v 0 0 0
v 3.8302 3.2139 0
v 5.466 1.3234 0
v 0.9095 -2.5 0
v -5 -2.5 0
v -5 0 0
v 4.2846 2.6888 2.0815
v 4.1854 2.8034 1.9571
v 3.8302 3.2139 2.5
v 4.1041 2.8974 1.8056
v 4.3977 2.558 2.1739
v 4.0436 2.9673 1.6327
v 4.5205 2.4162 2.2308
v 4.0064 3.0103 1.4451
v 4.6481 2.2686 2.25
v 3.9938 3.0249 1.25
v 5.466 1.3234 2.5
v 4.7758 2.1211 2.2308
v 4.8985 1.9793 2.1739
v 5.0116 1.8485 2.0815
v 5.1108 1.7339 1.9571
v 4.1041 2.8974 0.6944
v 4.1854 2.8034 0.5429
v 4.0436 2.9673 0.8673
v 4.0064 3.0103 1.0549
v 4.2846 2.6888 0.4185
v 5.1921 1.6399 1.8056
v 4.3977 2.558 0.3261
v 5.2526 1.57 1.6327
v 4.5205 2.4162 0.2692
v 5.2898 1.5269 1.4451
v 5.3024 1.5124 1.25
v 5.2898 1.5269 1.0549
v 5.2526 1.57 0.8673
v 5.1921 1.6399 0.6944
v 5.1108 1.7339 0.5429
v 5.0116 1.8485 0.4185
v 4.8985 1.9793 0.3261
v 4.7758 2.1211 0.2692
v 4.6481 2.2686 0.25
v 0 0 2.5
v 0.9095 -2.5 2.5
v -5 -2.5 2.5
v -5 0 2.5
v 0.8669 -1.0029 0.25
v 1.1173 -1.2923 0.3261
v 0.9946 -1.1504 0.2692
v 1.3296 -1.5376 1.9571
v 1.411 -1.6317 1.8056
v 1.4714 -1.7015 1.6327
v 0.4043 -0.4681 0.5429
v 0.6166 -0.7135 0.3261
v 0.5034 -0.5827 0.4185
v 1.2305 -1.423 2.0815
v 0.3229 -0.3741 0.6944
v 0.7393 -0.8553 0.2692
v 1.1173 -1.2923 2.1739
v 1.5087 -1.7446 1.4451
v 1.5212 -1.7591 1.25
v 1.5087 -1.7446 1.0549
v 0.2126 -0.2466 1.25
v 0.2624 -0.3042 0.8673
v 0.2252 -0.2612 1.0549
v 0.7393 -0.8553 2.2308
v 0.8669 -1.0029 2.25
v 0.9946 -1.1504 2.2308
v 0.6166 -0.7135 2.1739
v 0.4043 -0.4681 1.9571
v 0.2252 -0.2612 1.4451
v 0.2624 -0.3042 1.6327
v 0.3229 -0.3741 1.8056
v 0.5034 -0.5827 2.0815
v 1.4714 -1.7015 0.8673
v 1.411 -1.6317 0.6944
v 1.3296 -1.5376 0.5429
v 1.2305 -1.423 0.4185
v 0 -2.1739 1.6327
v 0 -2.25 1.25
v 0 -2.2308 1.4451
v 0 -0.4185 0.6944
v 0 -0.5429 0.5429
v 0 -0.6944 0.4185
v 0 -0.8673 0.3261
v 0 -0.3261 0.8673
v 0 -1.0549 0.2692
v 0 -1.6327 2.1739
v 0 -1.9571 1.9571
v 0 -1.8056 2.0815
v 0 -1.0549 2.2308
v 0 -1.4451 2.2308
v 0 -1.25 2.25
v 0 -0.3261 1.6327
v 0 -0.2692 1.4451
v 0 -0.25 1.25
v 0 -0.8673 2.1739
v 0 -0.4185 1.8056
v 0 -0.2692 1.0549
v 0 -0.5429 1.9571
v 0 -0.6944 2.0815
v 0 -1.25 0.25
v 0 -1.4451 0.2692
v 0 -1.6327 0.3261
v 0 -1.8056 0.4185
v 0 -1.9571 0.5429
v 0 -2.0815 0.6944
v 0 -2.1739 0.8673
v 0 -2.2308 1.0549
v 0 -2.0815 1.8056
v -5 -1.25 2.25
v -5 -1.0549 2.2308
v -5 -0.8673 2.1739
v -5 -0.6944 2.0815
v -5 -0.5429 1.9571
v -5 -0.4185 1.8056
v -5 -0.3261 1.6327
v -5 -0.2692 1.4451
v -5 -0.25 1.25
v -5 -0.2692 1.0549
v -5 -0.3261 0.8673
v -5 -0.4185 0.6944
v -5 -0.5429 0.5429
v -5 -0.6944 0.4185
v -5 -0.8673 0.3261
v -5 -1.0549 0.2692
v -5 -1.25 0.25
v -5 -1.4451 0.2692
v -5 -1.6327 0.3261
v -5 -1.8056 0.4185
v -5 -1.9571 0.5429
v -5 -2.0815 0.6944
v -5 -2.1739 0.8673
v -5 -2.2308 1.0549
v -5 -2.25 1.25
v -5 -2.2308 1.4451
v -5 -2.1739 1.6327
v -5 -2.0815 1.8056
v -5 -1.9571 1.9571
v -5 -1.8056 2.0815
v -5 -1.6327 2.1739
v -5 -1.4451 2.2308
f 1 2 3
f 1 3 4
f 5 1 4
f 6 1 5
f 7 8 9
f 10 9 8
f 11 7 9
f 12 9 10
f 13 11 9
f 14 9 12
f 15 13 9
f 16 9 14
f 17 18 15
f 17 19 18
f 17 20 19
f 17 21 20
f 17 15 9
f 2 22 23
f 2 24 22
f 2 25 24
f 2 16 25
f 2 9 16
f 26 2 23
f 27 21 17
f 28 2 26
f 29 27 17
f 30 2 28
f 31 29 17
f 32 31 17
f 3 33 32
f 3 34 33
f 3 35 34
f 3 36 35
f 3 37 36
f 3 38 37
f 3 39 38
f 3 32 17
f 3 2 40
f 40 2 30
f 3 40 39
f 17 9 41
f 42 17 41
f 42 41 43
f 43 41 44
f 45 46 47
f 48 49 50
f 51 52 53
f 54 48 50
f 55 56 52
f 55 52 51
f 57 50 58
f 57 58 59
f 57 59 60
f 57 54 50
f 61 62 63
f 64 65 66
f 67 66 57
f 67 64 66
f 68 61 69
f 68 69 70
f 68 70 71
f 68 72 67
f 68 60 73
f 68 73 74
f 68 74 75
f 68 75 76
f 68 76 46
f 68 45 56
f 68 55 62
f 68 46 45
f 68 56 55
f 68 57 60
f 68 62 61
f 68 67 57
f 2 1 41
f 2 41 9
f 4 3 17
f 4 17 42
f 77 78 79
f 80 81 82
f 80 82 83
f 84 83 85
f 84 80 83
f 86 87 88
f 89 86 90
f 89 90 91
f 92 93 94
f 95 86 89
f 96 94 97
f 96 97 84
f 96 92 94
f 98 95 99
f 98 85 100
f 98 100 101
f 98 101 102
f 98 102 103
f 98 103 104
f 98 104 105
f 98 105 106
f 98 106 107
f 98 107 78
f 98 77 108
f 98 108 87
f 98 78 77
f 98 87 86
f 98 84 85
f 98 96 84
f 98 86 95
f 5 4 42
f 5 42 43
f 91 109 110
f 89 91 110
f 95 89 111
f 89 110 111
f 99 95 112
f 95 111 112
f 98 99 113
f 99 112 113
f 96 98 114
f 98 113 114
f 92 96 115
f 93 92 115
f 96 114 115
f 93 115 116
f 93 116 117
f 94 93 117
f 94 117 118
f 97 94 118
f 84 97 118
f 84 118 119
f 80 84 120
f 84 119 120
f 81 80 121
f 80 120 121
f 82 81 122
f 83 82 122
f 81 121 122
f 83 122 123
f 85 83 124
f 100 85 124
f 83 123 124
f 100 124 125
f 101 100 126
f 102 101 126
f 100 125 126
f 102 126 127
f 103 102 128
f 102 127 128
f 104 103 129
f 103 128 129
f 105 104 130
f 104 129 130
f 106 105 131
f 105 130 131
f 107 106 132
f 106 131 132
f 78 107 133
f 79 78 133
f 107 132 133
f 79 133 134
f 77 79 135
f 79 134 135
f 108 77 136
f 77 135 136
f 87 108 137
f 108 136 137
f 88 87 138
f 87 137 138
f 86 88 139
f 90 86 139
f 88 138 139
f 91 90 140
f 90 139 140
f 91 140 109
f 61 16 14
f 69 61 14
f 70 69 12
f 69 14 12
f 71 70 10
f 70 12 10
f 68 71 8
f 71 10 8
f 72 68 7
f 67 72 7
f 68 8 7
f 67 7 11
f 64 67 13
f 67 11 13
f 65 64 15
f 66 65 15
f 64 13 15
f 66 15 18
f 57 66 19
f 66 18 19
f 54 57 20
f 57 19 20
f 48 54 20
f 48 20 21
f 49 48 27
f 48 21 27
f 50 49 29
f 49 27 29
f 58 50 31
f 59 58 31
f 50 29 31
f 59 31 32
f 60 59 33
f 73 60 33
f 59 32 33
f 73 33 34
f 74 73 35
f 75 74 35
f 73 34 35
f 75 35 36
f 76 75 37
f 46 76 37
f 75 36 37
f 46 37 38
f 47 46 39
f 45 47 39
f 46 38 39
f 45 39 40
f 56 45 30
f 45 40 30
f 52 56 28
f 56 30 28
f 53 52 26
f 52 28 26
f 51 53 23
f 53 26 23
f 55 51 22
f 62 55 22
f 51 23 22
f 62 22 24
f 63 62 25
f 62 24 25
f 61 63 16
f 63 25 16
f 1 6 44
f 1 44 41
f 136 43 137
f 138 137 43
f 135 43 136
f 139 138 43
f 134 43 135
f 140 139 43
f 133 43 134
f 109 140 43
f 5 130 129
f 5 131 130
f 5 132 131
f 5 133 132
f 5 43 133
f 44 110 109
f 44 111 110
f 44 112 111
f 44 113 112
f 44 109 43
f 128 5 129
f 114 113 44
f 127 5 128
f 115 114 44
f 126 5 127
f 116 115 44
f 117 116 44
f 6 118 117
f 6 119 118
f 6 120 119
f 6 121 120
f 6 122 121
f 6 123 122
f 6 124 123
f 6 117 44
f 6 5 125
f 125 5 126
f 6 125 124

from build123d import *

# Parameters (mm, degrees)
BOSS_EXTRUDE1_DEPTH = 2.5
SKETCH2_R           = 1
CUT_EXTRUDE1_DEPTH  = 5
SKETCH3_R           = 1
CUT_EXTRUDE2_DEPTH  = 5


with BuildPart() as part:
    # Sketch1 → Boss-Extrude1 (new body)
    with BuildSketch(Plane.XY):
        Polygon((-5, 0), (0, 0), (3.830222216, 3.213938048), (5.465982834, 1.323359513), (0.909480399, -2.5), (-5, -2.5), align=None)
    extrude(amount=BOSS_EXTRUDE1_DEPTH)

    # Sketch2 → Cut-Extrude1 (cut)
    with BuildSketch(Plane(origin=(3.780724263, 3.271146765, 0), x_dir=(0, 0, -1), z_dir=(0.7562314141303861, 0.6543042474891606, 0))):
        with Locations(Location((-1.25, -1.325649749, 0), (0, 0, 90))):
            Circle(SKETCH2_R)
    extrude(amount=-CUT_EXTRUDE1_DEPTH, mode=Mode.SUBTRACT)

    # Sketch3 → Cut-Extrude2 (cut)
    with BuildSketch(Plane.ZY.offset(5)):
        with Locations((1.25, -1.25)):
            Circle(SKETCH3_R)
    extrude(amount=-CUT_EXTRUDE2_DEPTH, mode=Mode.SUBTRACT)


solid = part.part
